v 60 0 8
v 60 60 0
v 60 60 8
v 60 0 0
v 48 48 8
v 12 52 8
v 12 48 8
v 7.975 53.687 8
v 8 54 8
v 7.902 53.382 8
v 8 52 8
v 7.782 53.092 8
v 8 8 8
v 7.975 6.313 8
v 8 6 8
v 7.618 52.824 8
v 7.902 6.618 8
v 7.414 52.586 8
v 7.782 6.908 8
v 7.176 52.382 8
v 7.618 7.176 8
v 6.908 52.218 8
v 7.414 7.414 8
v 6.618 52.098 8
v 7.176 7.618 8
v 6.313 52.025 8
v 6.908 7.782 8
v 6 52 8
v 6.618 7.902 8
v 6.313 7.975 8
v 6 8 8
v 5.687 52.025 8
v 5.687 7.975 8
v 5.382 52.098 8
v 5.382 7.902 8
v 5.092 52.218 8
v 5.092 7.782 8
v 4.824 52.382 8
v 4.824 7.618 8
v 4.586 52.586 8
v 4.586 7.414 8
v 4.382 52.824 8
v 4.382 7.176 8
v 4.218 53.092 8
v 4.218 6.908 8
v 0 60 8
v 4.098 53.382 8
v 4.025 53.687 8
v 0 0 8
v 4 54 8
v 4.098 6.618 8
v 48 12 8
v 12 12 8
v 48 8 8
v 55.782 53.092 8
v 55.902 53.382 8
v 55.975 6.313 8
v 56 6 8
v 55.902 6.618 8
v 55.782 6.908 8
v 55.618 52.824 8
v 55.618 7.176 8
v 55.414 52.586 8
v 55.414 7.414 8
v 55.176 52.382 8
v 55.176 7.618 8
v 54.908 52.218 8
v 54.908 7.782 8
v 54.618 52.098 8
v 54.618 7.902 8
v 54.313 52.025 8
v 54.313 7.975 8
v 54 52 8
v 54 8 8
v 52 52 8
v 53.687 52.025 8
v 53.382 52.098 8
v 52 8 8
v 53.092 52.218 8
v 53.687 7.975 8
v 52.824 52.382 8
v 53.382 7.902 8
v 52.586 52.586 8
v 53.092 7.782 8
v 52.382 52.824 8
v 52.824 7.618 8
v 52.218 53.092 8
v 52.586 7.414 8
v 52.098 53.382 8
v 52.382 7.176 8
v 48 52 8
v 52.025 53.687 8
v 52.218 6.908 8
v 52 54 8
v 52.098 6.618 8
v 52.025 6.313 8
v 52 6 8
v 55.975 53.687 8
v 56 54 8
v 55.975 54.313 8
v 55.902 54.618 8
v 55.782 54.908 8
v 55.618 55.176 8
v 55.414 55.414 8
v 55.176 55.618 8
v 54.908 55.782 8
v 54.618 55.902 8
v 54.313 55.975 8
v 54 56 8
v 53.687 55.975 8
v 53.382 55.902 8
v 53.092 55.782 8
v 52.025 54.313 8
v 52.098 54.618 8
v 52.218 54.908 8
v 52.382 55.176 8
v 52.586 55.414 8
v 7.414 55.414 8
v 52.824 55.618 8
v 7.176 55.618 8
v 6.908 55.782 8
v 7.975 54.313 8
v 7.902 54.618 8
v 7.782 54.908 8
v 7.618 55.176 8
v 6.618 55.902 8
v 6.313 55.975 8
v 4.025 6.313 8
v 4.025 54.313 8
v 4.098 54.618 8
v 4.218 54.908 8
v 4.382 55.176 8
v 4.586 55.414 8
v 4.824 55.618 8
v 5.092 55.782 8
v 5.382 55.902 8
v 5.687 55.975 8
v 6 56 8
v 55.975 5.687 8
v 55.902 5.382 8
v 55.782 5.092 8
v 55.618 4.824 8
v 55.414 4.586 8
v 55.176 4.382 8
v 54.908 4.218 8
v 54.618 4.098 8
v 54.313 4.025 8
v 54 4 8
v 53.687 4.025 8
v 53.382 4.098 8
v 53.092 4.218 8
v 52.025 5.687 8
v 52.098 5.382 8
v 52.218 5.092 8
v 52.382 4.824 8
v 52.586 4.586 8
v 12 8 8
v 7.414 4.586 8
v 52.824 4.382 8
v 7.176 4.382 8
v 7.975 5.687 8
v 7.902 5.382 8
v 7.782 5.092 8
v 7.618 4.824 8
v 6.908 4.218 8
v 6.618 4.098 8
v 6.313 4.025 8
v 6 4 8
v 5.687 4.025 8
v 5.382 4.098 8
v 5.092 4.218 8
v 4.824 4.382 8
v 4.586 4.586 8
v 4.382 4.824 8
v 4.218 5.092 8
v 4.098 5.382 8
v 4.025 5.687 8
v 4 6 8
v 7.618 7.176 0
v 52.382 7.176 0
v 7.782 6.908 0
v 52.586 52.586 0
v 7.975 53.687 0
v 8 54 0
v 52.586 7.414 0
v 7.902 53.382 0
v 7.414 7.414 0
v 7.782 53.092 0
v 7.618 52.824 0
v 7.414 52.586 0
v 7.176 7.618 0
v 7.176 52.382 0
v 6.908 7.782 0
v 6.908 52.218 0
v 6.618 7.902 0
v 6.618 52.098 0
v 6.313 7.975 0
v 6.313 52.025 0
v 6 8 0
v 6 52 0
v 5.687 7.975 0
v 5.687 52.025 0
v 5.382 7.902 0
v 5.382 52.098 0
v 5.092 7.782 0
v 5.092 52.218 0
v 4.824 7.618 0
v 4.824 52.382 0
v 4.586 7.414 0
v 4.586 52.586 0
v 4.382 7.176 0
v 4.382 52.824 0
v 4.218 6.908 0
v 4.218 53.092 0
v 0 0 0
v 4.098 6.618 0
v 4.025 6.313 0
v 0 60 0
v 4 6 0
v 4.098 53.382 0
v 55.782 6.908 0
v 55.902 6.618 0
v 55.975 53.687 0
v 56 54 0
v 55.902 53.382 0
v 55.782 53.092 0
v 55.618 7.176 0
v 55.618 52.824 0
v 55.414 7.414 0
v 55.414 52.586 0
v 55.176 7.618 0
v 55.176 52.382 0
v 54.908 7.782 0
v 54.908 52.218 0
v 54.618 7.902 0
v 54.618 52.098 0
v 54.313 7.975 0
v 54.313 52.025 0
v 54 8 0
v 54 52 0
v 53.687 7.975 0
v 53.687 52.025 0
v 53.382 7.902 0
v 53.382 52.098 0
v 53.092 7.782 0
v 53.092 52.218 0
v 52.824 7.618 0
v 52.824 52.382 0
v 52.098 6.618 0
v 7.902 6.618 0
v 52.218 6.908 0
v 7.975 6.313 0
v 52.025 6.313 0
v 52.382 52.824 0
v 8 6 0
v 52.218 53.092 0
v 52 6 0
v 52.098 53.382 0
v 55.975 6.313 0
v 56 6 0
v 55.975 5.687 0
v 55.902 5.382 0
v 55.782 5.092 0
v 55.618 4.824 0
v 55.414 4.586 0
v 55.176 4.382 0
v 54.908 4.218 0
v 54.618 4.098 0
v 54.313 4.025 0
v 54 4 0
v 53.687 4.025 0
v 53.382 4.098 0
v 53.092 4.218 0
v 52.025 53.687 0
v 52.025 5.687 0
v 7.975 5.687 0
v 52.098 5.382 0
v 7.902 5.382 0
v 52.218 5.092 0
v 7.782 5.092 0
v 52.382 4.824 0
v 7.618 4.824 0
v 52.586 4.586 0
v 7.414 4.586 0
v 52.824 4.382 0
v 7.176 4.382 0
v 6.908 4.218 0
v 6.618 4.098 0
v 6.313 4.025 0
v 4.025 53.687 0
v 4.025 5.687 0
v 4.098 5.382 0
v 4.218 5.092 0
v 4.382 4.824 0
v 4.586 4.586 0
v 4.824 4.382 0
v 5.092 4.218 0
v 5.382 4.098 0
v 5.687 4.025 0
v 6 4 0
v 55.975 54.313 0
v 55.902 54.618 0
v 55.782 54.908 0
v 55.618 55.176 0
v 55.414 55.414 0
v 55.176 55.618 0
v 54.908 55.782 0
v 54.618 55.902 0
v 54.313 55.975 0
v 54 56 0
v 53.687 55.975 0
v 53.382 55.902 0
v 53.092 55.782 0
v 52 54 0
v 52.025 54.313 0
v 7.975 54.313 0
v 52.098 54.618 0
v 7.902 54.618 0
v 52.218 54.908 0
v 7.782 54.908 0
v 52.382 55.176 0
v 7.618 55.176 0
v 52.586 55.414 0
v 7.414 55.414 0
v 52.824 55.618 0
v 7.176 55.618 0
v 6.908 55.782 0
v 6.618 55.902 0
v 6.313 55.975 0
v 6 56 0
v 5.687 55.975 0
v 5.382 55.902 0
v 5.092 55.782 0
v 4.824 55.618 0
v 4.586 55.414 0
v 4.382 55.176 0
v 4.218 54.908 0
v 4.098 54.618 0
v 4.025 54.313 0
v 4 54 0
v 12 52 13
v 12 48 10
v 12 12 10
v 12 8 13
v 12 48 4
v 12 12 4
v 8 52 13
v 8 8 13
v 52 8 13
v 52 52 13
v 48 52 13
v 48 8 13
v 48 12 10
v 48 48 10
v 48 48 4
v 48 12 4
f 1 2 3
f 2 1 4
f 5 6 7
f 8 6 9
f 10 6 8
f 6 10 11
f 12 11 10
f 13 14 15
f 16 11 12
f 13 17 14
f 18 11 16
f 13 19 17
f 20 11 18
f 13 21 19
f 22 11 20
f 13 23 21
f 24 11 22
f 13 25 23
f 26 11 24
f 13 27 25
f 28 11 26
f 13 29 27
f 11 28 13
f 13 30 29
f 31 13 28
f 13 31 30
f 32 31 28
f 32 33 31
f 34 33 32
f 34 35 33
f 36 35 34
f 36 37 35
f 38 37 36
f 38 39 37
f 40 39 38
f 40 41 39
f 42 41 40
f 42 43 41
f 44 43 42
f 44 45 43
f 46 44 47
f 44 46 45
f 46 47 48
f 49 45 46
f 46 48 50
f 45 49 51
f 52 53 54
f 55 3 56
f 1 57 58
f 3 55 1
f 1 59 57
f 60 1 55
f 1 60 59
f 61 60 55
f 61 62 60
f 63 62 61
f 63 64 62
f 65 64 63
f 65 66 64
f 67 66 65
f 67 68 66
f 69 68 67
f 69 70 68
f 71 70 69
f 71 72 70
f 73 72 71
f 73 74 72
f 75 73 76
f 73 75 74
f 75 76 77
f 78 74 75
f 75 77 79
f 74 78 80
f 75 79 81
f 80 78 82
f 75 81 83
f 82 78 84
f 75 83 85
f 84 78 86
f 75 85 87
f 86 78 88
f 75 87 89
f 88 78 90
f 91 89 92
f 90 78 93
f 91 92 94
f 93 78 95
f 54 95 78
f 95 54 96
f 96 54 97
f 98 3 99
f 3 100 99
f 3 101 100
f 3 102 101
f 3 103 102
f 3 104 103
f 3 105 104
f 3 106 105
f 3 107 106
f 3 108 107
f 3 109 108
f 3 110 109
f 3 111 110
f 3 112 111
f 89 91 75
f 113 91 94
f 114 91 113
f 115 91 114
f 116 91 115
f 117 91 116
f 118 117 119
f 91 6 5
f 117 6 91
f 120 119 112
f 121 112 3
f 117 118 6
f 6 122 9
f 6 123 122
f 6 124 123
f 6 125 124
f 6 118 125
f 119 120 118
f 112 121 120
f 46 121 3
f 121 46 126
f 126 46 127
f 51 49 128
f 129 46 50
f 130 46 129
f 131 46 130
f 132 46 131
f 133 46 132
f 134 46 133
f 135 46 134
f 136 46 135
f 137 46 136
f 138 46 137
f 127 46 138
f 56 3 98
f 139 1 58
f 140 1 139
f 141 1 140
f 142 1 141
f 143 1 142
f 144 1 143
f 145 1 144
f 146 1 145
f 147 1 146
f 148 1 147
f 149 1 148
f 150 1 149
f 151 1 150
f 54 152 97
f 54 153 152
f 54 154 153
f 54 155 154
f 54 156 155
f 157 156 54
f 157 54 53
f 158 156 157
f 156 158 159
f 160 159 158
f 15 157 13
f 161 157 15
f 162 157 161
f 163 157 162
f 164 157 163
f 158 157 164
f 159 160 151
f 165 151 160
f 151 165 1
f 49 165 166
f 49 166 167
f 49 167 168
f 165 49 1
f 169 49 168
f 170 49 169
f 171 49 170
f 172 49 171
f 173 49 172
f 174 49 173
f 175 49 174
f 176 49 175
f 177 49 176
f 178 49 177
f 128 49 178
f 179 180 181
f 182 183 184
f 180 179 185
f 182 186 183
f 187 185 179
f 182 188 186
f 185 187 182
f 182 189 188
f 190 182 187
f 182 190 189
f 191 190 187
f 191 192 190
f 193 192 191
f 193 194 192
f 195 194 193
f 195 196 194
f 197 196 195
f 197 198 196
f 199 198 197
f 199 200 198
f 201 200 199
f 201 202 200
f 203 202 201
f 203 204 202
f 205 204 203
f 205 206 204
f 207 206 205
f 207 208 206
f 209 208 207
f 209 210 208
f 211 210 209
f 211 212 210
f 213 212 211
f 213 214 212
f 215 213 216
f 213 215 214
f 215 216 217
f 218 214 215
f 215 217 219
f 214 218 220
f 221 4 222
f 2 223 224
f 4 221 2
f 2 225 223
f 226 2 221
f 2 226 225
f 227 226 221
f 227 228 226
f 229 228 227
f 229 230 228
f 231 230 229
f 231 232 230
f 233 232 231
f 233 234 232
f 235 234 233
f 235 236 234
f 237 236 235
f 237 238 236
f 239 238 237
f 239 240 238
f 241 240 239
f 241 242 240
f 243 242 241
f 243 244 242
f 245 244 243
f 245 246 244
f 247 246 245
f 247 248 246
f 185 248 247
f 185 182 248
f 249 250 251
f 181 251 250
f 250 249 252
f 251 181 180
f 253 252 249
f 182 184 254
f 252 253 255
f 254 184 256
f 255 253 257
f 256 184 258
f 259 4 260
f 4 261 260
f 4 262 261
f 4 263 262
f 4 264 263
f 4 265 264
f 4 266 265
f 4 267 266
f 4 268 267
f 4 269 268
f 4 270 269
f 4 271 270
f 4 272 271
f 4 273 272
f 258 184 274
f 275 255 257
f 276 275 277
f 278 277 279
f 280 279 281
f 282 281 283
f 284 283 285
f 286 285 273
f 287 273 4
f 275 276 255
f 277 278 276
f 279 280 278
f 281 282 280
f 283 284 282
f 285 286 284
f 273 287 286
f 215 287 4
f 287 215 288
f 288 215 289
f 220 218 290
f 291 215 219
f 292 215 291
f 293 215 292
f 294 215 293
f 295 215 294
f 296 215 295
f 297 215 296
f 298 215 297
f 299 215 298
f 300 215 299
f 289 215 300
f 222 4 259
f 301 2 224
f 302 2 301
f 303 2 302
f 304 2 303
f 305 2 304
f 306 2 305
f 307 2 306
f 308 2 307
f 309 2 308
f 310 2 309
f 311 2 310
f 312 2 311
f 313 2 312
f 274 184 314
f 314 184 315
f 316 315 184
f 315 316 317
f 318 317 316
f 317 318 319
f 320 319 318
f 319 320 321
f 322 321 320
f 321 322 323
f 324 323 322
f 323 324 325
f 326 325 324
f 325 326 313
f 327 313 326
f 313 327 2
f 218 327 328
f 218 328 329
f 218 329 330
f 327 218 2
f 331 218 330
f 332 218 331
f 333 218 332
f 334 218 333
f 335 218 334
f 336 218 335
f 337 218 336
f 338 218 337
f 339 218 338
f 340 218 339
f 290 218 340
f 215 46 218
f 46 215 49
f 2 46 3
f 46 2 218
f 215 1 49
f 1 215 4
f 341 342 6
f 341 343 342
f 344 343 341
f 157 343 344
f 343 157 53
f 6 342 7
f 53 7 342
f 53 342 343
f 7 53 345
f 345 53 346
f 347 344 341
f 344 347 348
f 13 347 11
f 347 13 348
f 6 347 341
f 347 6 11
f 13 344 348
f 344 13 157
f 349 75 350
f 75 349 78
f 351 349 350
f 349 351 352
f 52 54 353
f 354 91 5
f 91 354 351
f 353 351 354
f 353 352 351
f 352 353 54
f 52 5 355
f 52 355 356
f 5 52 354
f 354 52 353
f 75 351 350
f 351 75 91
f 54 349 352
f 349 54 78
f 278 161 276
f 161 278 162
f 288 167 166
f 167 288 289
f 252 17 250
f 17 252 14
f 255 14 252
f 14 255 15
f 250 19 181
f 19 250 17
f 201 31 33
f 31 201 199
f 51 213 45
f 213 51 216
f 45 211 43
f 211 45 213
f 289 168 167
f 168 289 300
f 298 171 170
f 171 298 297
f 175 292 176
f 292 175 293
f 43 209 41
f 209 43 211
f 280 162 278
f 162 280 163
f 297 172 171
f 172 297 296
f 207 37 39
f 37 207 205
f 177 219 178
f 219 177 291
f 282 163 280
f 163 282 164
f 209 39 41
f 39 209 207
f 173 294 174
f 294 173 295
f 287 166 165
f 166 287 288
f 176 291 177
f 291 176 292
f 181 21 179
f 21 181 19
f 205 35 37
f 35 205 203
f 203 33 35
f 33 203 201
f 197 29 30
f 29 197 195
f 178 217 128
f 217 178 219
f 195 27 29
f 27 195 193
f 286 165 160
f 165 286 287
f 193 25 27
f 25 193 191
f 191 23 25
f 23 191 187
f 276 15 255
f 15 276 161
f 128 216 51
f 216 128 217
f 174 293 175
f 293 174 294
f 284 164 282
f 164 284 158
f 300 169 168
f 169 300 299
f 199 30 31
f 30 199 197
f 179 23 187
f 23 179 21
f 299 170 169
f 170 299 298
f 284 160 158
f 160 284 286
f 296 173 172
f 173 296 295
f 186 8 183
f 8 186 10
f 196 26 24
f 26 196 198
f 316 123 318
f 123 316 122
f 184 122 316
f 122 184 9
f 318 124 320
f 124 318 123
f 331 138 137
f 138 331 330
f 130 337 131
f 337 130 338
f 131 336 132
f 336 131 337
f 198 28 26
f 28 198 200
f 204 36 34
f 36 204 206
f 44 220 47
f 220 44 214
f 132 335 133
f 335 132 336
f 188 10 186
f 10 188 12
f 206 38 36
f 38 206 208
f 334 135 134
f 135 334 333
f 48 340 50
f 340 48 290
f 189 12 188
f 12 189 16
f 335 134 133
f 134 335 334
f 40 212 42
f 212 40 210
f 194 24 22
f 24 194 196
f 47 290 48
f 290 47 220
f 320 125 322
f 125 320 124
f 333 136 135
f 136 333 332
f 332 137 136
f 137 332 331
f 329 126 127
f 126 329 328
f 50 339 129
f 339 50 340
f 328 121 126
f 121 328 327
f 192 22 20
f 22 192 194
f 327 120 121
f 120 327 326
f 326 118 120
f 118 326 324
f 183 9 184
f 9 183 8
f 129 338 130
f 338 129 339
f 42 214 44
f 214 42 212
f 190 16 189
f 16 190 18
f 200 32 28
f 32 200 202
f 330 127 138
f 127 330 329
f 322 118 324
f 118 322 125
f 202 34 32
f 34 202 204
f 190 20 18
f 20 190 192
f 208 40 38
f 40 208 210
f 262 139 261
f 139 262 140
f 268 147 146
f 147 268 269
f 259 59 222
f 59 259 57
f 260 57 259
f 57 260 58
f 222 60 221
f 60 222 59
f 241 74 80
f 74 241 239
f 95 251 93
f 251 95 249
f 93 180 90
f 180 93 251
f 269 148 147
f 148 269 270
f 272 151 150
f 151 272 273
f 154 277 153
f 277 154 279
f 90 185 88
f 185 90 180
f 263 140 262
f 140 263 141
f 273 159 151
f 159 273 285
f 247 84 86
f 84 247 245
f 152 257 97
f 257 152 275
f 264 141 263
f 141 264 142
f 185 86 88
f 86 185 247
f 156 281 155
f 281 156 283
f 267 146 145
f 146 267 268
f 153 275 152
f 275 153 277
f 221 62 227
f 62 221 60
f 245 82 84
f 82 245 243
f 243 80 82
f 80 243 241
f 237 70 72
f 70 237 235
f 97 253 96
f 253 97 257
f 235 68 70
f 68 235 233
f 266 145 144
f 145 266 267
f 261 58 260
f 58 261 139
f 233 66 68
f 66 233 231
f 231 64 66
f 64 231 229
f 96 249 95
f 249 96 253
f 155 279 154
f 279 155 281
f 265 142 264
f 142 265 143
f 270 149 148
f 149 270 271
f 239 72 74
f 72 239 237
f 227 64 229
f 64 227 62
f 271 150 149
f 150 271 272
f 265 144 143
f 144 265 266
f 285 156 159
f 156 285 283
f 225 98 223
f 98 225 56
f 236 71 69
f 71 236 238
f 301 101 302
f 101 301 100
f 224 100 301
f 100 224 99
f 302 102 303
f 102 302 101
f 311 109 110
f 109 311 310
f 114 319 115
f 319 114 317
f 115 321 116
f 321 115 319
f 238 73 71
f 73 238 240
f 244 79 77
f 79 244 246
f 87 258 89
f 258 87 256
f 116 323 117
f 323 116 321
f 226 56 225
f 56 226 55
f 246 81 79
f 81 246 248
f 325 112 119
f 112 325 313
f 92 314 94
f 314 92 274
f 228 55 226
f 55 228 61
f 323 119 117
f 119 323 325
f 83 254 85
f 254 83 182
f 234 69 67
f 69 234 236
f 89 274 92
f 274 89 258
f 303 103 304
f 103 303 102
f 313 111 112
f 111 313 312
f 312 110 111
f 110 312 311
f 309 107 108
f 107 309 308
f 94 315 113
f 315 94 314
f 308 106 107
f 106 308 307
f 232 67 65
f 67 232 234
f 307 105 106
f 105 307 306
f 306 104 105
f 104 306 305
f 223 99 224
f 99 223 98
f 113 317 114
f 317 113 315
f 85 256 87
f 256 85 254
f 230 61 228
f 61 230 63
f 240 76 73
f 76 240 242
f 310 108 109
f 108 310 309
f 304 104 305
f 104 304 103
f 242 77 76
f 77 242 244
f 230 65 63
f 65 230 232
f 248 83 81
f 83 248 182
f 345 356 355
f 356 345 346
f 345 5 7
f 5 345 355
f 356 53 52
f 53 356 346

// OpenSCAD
$fn=64;
module flipchip_fixture() {
  difference() {
    union() {
      cube([60,60,8]);
      translate([8,8,8]) cube([4,44,5]);
      translate([48,8,8]) cube([4,44,5]);
    }
    translate([12,12,4]) cube([36,36,6]);
    for(x=[6,54]) for(y=[6,54])
      translate([x,y,-1]) cylinder(d=4,h=10,$fn=40);
  }
}
flipchip_fixture();
